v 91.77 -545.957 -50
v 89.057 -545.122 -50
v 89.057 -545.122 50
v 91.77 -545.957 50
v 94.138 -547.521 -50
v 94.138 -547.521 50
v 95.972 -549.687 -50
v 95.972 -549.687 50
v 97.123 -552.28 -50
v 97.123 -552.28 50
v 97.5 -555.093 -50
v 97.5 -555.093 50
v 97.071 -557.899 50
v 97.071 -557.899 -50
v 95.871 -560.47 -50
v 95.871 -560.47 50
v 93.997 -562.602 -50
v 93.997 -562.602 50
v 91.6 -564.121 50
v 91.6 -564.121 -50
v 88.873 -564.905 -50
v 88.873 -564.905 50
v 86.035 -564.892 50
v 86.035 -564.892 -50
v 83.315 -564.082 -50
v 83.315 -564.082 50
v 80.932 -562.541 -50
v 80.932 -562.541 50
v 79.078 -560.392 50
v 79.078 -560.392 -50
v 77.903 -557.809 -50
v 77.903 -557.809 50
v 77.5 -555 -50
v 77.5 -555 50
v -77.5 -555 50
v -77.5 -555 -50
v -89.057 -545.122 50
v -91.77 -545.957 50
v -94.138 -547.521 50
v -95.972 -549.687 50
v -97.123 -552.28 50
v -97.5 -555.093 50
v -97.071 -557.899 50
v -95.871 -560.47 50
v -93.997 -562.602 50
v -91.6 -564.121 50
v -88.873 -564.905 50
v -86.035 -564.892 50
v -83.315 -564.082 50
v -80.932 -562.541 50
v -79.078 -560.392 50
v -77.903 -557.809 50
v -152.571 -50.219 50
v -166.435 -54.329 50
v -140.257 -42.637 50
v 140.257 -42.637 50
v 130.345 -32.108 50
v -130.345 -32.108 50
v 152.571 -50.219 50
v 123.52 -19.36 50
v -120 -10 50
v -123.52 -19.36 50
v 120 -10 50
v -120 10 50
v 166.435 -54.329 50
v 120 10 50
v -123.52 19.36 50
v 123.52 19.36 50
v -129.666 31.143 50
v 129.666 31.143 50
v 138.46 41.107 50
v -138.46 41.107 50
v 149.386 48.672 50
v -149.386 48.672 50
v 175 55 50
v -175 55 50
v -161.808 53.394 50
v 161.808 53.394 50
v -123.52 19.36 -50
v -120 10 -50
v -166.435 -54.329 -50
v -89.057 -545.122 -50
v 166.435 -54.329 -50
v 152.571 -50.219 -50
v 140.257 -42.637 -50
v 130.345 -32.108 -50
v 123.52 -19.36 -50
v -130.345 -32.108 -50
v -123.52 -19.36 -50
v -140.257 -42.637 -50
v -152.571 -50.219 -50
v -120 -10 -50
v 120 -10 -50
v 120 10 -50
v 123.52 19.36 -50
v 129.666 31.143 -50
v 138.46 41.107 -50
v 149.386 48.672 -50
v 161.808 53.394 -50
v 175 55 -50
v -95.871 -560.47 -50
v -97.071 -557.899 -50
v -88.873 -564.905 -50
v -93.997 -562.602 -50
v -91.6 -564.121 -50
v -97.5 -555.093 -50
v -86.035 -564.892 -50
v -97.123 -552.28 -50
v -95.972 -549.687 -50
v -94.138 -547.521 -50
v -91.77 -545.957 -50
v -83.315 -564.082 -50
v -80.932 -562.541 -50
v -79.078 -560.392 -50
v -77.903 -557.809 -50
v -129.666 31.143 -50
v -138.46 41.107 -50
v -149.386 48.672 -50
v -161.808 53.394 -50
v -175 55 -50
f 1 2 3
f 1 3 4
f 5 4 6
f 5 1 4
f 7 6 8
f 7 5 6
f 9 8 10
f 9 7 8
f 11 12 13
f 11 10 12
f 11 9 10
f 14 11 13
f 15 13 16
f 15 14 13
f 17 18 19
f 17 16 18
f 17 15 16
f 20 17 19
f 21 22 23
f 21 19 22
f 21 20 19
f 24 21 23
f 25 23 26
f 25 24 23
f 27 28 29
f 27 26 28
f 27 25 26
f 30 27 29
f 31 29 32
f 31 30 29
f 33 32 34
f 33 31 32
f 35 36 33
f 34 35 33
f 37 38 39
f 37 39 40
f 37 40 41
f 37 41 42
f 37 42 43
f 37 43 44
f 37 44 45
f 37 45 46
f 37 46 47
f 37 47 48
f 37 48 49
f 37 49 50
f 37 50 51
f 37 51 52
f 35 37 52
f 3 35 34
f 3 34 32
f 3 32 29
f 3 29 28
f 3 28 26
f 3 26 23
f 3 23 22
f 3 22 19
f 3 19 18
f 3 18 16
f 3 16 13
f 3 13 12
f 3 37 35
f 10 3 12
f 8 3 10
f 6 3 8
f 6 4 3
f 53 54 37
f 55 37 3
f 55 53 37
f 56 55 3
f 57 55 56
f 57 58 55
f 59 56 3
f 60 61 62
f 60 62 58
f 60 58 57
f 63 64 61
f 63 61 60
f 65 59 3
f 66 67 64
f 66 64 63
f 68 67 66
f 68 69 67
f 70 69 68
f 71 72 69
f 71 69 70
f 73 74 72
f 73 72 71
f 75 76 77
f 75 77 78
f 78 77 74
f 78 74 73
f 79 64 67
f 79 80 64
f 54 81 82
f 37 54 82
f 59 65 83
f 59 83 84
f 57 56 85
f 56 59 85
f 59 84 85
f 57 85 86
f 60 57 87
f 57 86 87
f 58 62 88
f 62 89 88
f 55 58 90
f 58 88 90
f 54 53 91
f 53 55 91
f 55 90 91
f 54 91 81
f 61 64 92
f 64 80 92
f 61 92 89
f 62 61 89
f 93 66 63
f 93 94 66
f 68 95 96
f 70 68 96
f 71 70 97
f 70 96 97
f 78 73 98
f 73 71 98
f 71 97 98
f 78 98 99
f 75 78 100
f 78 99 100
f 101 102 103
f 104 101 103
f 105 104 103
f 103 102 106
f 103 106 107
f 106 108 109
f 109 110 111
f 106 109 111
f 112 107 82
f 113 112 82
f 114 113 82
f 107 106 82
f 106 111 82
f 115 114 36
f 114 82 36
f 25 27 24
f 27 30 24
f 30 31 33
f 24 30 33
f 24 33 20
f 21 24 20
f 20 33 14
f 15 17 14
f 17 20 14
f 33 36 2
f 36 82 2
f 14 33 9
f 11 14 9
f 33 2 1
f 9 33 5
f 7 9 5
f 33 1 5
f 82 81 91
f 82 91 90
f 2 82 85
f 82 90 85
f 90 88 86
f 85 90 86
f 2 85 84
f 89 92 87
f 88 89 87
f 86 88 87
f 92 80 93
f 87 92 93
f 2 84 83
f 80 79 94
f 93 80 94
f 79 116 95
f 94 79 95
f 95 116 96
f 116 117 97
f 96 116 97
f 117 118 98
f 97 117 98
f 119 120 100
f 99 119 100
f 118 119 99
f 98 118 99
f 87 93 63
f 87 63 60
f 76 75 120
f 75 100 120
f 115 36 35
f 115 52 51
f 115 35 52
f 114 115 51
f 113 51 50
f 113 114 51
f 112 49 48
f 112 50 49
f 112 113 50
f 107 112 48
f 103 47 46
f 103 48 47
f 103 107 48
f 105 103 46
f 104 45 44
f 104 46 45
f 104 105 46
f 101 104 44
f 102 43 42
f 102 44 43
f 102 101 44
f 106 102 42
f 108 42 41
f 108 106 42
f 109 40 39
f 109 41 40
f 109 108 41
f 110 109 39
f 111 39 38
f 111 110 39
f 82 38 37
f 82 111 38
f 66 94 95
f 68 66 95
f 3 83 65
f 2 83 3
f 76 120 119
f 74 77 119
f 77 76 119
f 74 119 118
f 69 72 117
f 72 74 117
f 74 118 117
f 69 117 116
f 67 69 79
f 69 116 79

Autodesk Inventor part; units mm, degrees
ref_plane "YZ Plane" through (0, 0, 0) normal (1, 0, 0) x (0, 1, 0)
ref_plane "XZ Plane" through (0, 0, 0) normal (0, 1, 0) x (-1, 0, 0)
ref_plane "XY Plane" through (0, 0, 0) normal (0, 0, 1) x (1, 0, 0)
sketch "Эскиз1" plane through (0, 0, 0) normal (0, 0, 1) x (1, 0, 0)
  line L0 (-175, 0) -> (175, 0)
  line L1 (0, 0) -> (0, -465)
  line L2 (0, -465) -> (-87.5, -555)
  line L3 (-87.5, -555) -> (87.5, -555)
  line L4 (87.5, -555) -> (0, -465)
  circle A0 centre (175, 0) radius 55
  circle A1 centre (-175, 0) radius 55
  circle A2 centre (87.5, -555) radius 70
  circle A3 centre (-87.5, -555) radius 70
  line L5 (175, 0) -> (87.5, -555)
  line L6 (-175, 0) -> (-87.5, -555)
  line L7 (175, 55) -> (-175, 55)
  line L8 (87.5, -625) -> (-87.5, -625)
  line L9 (-120, 10) -> (-120, -10)
  line L10 (120, 10) -> (120, -10)
  line L11 (-120, 10) -> (-123.52, 19.36)
  line L12 (-120, -10) -> (-123.52, -19.36)
  line L13 (120, 10) -> (123.52, 19.36)
  line L14 (120, -10) -> (123.52, -19.36)
  circle A4 centre (87.5, -555) radius 10
  circle A5 centre (-87.5, -555) radius 10
  point P0 (0, -555)
  point P1 (166.4346, -54.3289)
  point P2 (-166.4346, -54.3289)
  point P3 (-98.4014, -485.8541)
  point P4 (98.4014, -485.8541)
  point P5 (120, 0)
  point P6 (-120, 0)
  point P7 (-38.7045, -504.8104)
  point P8 (38.7045, -504.8104)
  point P9 (89.0573, -545.122)
  point P10 (-89.0573, -545.122)
  point P11 (-77.5, -555)
  point P12 (77.5, -555)
  dimension "d10" = 140
  dimension "d11" = 140
  dimension "d4" = 90
  dimension "d5" = 175
  dimension "d6" = 350
  dimension "d7" = 110
  dimension "d8" = 110
  dimension "d9" = 465
  dimension "d14" = 20
  dimension "d15" = 20
  dimension "d16" = 20
  dimension "d17" = 20
extrude "Выдавливание1" add sketch "Эскиз1" along normal mid plane 100 contours L9 L11 A1 L7 A0 L13 L10 L0 | L0 L1 L2 A3 L6 A1 L12 L9 | L0 L10 L14 A0 L5 A2 L4 L1 | A3 L2 A5 L6 | L4 A2 L3 A3 L2 | A3 L3 A5 L2 | A5 L2 L6 | L6 L3 A5 | A2 L5 A4 L4 | L4 A4 L3 A2 | A5 L3 L2 | A4 L5 L4 | L4 L3 A4 | L5 A4 L3
equation "\"d10\" = hip_diam"
equation "\"d11\" = d10"
equation "\"d4\" = hip_joint_hight"
equation "\"d5\" = hip_joint_width"
equation "\"d6\" = clavicular_width"
equation "\"d7\" = shoulder_radius"
equation "\"d8\" = d7"
equation "\"hip_diam\" = 140"
equation "\"hip_joint_hight\" = 90"
equation "\"hip_joint_width\" = 175"
equation "\"clavicular_width\" = 350"
equation "\"shoulder_radius\" = 110"
properties part number "ч ASY human dummy 01"
